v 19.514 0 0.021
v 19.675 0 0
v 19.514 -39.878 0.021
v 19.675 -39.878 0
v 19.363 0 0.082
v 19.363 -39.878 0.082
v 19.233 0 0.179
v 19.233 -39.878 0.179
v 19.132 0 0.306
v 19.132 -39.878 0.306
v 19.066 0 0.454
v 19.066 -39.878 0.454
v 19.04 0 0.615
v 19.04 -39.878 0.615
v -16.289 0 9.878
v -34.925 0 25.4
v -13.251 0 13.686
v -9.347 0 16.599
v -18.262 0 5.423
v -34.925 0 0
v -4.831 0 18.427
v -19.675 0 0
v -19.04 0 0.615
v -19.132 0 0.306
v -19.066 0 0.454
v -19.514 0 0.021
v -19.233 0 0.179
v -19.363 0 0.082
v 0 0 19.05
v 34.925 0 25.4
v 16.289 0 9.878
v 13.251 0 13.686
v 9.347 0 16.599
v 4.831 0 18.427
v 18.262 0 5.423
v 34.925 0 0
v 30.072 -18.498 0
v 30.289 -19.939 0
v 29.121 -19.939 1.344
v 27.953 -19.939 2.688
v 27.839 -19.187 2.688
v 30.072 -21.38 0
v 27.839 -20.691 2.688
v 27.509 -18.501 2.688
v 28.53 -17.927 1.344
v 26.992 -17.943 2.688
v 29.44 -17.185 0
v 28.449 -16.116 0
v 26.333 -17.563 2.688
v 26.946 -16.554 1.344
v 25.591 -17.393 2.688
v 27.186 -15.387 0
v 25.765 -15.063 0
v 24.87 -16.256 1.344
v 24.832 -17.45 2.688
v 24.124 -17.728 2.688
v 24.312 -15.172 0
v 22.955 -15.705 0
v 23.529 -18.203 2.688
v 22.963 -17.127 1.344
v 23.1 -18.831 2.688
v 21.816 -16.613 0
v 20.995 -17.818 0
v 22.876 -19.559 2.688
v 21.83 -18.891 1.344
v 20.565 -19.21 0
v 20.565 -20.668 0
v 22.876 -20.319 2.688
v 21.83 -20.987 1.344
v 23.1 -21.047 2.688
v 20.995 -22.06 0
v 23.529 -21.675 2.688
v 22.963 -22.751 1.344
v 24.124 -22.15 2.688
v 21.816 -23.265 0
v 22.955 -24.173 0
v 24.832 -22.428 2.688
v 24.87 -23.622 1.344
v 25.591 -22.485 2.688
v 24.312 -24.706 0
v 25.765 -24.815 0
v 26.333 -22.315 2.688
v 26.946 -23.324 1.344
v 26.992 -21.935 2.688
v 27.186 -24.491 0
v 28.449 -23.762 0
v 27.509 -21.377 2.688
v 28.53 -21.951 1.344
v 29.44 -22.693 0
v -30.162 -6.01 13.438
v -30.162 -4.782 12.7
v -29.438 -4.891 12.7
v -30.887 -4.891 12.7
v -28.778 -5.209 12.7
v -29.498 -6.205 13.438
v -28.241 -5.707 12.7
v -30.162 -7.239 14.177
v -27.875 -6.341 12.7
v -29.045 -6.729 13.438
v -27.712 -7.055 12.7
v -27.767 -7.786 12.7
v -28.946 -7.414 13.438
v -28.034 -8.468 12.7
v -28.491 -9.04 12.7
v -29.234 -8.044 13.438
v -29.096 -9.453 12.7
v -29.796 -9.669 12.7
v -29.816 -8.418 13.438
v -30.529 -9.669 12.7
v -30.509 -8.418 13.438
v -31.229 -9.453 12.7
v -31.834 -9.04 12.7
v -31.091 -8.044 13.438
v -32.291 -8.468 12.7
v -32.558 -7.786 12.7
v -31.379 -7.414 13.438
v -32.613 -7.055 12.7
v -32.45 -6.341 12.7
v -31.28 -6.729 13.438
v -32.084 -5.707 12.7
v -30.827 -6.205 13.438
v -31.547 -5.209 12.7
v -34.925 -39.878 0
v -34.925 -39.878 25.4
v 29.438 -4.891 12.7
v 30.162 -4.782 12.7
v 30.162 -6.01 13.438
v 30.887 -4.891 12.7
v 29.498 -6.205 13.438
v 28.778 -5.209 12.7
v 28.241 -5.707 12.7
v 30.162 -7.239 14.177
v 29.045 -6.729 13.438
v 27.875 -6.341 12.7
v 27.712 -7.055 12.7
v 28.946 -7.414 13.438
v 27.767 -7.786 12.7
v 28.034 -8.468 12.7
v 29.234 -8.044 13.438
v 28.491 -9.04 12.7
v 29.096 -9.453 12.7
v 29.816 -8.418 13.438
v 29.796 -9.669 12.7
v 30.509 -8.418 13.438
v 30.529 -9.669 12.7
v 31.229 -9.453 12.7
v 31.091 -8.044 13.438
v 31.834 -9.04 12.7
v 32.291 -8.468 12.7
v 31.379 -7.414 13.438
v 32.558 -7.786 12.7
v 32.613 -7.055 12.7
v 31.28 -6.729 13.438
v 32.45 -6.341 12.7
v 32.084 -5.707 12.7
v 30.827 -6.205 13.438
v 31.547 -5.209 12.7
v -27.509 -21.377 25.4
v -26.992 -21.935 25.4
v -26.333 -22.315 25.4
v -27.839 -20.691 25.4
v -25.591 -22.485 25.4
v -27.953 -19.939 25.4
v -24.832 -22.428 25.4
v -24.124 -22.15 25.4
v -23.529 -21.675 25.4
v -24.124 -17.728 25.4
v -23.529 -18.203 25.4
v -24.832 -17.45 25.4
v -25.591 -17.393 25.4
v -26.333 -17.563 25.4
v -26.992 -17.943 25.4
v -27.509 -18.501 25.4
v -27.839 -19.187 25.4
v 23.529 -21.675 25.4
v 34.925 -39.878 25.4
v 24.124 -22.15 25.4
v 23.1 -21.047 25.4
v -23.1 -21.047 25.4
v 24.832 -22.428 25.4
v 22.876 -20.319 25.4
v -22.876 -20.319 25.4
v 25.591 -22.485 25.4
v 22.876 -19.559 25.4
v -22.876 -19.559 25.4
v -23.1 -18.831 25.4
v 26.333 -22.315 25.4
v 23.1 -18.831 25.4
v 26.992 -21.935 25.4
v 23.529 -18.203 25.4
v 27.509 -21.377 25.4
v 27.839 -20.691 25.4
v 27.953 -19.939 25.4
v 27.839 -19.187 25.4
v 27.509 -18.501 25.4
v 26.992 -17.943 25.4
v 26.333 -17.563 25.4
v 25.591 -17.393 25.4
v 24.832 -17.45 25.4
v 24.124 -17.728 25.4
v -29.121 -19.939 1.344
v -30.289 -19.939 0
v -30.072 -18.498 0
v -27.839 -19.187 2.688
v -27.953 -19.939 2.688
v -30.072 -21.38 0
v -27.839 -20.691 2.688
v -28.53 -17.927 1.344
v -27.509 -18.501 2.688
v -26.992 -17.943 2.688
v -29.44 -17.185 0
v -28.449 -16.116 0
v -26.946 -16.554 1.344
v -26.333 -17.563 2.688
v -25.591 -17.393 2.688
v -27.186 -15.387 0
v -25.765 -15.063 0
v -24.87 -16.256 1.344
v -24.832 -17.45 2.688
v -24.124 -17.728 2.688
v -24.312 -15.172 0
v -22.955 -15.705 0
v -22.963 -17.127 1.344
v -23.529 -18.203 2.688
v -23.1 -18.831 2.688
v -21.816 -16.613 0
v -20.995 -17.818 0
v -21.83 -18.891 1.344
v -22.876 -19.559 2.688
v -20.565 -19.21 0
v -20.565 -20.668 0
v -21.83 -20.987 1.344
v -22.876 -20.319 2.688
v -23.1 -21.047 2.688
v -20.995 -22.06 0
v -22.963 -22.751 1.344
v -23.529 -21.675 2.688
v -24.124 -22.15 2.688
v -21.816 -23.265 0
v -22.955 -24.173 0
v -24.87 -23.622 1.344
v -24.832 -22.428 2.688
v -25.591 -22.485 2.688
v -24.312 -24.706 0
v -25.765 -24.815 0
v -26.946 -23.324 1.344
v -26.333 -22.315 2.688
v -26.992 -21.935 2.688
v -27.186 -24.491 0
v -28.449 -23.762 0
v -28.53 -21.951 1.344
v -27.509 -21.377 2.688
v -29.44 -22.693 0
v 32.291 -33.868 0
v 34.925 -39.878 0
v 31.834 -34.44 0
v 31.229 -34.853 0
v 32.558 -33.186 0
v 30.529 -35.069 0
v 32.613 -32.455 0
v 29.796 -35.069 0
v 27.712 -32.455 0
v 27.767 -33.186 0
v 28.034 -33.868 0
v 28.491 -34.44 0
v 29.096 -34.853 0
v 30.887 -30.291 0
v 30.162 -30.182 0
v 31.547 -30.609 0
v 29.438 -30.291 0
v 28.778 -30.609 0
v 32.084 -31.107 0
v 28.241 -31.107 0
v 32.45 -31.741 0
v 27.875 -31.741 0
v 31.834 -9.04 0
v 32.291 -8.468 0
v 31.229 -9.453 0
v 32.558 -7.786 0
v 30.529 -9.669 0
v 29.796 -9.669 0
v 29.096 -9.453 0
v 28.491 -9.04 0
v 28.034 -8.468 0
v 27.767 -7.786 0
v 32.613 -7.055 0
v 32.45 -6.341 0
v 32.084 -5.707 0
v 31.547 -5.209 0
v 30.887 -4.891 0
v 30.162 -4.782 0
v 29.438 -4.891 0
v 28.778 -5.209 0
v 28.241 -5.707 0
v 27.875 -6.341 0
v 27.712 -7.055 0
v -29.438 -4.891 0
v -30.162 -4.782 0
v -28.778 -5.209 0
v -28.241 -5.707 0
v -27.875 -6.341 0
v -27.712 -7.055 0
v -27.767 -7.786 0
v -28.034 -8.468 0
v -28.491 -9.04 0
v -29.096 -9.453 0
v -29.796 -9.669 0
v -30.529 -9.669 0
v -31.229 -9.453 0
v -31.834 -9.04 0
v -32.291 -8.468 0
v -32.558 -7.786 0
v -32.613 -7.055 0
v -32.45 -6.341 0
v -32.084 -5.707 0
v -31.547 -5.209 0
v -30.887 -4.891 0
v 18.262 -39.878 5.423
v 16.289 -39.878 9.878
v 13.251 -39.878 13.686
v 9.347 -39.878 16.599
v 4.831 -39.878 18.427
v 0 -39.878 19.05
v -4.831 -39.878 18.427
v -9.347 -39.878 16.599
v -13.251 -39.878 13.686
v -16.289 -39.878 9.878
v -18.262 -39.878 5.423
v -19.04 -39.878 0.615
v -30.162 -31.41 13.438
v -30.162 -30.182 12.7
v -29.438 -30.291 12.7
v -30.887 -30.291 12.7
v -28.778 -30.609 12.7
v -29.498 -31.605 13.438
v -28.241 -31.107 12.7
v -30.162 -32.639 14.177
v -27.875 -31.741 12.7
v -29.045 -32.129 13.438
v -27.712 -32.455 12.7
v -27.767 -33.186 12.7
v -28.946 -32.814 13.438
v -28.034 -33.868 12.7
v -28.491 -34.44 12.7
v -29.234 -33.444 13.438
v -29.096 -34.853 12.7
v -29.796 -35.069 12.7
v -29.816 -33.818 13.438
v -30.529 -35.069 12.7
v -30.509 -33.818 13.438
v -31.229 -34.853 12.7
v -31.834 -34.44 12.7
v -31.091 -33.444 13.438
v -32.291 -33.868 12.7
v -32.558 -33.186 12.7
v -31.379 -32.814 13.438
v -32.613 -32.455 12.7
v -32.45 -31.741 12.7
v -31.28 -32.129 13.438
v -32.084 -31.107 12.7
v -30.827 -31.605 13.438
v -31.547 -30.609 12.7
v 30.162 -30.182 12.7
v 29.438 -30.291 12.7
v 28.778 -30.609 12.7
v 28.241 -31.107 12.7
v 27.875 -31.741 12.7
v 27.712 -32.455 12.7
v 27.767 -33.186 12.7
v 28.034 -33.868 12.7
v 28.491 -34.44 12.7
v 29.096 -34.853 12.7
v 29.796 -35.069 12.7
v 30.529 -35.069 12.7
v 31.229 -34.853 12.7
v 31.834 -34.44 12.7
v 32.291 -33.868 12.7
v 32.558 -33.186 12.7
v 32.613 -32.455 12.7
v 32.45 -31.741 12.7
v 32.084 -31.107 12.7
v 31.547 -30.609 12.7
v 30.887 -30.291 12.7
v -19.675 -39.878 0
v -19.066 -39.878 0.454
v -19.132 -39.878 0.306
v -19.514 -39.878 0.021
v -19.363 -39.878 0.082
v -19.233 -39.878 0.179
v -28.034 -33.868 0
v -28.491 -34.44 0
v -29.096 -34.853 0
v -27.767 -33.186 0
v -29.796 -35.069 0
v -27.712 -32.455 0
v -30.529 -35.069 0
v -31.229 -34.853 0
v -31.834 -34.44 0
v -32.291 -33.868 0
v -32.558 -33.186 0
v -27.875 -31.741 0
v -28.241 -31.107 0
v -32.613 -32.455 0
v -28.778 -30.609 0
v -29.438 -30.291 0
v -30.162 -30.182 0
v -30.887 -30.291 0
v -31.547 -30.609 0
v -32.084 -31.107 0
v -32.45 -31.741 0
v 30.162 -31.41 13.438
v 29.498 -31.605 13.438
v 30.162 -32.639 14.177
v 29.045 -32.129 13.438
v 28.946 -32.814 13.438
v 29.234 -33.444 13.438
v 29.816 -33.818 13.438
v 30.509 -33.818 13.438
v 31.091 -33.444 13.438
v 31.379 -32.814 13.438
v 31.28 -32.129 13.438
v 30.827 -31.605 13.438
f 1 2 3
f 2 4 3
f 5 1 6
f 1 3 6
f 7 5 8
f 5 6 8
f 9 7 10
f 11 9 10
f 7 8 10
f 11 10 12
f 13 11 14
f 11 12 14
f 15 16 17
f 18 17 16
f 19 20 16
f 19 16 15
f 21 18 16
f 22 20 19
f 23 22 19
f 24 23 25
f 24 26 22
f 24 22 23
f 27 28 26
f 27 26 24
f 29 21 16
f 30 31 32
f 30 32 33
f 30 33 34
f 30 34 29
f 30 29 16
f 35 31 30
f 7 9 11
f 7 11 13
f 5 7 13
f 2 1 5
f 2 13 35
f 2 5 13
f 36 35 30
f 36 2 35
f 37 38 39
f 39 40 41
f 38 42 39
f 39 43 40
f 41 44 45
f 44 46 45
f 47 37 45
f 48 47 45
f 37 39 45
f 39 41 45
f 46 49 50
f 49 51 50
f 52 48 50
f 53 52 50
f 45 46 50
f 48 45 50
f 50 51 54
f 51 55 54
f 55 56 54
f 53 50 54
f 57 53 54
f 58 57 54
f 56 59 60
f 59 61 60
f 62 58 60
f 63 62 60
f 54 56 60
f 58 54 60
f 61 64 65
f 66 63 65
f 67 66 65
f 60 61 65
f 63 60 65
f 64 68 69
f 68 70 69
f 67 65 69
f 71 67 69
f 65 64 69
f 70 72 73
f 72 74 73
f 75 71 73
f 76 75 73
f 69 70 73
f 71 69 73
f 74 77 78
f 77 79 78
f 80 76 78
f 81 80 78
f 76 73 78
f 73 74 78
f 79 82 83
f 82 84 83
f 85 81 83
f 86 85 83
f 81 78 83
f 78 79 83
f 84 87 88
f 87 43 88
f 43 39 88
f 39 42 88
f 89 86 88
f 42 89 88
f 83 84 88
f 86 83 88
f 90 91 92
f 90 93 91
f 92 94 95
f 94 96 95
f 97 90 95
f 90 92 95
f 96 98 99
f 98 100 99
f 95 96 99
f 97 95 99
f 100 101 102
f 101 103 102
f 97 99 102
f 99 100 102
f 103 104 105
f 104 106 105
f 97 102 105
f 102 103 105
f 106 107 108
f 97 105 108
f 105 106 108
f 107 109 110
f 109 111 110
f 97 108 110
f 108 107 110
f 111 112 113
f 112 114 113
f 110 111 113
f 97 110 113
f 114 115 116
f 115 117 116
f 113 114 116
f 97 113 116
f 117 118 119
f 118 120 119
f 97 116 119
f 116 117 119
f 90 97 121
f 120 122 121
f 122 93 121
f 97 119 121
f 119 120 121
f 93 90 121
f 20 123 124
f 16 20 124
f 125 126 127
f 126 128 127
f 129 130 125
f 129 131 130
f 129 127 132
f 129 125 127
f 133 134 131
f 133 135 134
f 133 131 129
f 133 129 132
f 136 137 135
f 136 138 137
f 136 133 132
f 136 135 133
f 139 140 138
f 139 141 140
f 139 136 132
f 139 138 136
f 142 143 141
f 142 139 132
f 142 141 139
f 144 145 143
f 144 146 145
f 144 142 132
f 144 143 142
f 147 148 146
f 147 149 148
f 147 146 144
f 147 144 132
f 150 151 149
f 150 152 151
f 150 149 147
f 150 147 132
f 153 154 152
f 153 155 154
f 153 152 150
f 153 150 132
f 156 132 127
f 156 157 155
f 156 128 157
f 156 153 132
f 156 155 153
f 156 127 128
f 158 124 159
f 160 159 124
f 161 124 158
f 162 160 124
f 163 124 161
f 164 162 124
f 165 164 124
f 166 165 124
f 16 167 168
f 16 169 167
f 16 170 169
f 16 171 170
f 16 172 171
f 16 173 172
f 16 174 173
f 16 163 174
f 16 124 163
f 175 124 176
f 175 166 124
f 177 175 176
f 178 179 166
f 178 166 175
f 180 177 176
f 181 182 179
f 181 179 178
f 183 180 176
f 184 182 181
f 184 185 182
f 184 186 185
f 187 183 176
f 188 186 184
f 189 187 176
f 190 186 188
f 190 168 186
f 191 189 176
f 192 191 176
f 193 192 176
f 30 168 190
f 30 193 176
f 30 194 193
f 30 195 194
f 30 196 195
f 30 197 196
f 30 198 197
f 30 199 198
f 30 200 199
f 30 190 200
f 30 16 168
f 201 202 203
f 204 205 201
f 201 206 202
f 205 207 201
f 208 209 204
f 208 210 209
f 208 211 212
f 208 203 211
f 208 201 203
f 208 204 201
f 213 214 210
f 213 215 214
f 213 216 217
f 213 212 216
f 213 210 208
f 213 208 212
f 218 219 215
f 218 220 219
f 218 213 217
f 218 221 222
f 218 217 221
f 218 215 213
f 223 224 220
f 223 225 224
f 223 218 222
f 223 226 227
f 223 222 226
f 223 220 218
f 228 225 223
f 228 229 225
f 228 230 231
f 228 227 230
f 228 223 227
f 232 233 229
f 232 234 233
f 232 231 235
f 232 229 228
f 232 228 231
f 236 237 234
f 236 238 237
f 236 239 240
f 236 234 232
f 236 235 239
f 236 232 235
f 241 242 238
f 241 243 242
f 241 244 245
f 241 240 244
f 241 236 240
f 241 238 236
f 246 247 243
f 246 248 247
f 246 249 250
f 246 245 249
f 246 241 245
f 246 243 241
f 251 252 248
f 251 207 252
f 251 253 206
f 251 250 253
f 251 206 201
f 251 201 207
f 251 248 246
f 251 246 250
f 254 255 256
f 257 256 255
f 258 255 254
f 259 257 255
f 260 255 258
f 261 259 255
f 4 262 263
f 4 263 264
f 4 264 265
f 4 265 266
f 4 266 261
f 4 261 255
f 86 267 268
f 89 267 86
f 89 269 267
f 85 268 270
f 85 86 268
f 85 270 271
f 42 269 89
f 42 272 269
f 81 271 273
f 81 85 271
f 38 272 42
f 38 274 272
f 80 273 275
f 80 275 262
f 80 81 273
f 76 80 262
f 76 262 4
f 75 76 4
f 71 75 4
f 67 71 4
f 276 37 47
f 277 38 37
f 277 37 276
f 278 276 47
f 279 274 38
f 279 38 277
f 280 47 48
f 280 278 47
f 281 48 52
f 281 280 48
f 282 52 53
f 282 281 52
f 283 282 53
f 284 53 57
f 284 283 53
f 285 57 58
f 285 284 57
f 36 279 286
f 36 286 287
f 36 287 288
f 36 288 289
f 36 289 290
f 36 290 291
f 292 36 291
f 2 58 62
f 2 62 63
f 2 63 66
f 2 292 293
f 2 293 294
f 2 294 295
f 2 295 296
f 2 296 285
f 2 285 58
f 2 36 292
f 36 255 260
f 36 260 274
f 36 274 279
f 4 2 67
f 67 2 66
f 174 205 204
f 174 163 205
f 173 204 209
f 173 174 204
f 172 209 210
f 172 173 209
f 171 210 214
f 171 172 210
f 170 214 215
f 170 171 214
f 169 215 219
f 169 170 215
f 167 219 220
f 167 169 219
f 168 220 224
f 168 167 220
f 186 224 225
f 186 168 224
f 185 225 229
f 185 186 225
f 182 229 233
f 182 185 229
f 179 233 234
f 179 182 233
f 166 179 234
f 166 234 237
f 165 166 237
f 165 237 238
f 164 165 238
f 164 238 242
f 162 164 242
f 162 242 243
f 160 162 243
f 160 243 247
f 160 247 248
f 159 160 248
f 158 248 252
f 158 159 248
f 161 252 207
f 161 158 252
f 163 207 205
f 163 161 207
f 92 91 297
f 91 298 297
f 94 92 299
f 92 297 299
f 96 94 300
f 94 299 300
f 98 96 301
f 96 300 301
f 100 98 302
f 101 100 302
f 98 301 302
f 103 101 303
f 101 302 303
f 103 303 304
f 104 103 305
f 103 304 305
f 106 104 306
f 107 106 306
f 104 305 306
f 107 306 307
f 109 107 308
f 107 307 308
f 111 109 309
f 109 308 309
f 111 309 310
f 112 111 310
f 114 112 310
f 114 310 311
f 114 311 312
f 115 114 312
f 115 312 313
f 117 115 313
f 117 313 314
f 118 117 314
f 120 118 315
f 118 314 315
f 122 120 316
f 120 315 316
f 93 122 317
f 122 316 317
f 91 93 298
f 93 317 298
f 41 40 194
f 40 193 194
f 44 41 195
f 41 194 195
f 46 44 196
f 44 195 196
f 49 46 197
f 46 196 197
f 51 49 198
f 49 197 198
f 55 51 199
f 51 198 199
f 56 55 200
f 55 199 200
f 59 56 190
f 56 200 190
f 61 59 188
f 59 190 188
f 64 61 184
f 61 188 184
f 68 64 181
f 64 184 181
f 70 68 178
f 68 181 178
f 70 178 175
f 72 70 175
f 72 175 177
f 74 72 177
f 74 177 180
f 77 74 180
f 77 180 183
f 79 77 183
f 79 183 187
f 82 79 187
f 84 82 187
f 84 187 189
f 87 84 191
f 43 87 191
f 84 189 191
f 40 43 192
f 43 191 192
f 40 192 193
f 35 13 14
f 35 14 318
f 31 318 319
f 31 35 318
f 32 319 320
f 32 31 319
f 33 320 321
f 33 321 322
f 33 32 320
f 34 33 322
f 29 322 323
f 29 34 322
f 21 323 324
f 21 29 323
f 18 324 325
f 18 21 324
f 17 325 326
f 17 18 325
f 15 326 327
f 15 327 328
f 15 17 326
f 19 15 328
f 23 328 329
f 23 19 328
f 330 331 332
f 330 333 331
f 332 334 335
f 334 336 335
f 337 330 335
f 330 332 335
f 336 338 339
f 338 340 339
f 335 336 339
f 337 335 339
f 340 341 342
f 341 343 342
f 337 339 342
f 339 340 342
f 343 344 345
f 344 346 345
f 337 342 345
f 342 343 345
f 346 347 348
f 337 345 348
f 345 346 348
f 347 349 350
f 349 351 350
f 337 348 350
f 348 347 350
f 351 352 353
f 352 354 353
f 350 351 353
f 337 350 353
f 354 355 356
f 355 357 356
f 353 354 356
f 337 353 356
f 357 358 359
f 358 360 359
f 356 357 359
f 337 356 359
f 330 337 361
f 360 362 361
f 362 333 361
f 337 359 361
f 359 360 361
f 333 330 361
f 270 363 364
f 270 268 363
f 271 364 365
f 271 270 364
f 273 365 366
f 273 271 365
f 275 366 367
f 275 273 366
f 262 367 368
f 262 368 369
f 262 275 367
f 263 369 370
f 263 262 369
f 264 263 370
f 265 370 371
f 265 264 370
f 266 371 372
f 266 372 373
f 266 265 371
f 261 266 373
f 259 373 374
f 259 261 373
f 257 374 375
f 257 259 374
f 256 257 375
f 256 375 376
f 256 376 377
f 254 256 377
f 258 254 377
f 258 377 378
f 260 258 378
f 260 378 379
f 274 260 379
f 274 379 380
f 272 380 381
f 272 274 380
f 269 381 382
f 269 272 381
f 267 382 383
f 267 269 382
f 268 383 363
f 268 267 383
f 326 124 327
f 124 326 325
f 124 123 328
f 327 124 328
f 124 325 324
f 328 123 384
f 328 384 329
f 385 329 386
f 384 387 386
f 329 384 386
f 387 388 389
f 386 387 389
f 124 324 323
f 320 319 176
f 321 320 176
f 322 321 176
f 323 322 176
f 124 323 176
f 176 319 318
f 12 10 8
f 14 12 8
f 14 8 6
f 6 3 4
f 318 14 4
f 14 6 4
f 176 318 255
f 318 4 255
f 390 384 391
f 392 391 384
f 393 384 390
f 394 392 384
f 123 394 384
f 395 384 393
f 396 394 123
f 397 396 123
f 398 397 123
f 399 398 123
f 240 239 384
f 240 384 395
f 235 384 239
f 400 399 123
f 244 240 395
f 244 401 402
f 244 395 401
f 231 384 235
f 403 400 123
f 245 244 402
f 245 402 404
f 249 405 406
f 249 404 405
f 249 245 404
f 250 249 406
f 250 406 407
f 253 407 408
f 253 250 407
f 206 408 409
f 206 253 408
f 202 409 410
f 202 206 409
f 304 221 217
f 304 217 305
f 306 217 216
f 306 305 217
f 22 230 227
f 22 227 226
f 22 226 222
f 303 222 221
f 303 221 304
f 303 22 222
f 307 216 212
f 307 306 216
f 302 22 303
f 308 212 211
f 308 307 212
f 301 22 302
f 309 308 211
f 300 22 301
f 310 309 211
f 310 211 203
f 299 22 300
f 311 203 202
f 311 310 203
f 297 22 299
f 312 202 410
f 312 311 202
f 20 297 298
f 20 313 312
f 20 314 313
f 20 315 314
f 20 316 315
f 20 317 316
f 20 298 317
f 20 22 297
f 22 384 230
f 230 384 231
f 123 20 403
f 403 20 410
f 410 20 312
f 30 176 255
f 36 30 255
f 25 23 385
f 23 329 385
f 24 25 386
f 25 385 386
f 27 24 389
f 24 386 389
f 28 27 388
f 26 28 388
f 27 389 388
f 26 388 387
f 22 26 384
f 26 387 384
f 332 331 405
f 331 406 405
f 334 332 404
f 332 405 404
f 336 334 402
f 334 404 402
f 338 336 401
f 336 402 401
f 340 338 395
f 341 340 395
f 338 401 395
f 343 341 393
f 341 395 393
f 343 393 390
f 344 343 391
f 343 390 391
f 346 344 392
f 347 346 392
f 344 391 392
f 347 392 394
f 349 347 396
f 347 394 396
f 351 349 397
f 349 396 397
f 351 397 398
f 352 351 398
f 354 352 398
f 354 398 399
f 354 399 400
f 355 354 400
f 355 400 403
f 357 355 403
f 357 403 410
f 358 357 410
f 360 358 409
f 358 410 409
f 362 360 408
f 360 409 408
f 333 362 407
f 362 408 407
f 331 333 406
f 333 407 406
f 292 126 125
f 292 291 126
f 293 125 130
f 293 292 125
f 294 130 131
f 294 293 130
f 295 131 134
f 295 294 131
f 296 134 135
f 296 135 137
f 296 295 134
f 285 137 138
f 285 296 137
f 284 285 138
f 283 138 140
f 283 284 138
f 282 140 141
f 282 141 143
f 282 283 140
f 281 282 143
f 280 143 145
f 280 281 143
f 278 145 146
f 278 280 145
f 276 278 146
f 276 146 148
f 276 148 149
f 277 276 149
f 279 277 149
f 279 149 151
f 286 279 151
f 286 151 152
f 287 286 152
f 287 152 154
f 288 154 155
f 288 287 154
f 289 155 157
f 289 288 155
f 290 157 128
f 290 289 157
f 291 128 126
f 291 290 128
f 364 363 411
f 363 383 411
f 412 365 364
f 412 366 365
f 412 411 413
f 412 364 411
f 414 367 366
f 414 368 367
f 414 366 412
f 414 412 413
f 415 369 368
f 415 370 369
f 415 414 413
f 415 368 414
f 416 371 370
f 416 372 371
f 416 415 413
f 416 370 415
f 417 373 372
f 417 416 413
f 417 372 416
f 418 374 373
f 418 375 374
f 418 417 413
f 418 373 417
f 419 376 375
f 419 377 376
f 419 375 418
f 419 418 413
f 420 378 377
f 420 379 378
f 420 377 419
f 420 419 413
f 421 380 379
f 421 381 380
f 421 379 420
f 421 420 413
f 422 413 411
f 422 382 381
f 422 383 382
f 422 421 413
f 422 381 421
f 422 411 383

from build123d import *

# Parameters (mm, degrees)
BOSS_EXTRUDE2_DEPTH                                = 39.878
FILLET1_R                                          = 0.635
CSK_FOR_10_FLAT_HEAD_MACHINE_SCREW_100_D           = 5.1054
CSK_FOR_10_FLAT_HEAD_MACHINE_SCREW_100_CSINK_D     = 9.779
CSK_FOR_10_FLAT_HEAD_MACHINE_SCREW_100_CSINK_ANGLE = 82
F_10_0_1935_DIAMETER_HOLE2_AT_2_COUNT              = 2
F_10_0_1935_DIAMETER_HOLE2_AT_2_PITCH              = 25.4


with BuildPart() as part:
    # Sketch5 → Boss-Extrude2 (new body)
    with BuildSketch(Plane(origin=(0, 0, 0), x_dir=(1, 0, 0), z_dir=(0, 1, 0))):
        with BuildLine():
            Line((-34.925, 0), (-34.925, -25.4))
            Line((-34.925, -25.4), (34.925, -25.4))
            Line((34.925, -25.4), (34.925, 0))
            Line((34.925, 0), (19.05, 0))
            ThreePointArc((19.05, 0), (0, -19.05), (-19.05, 0))
            Line((-19.05, 0), (-34.925, 0))
        make_face()
    extrude(amount=-BOSS_EXTRUDE2_DEPTH)

    # Fillet1
    fillet1_edges = [part.edges().sort_by_distance(p)[0] for p in [
        (-19.05, -19.939, 0),
        (19.05, -19.939, 0),
    ]]
    fillet(fillet1_edges, radius=FILLET1_R)

    # CSK for #10 Flat Head Machine Screw (100)1 (through all)
    with Locations(Plane(origin=(0, 0, 0), x_dir=(-1, 0, 0), z_dir=(0, 0, -1))):
        with Locations((-25.4, -19.939)):
            csk_for_10_flat_head_machine_screw_100 = CounterSinkHole(CSK_FOR_10_FLAT_HEAD_MACHINE_SCREW_100_D / 2, CSK_FOR_10_FLAT_HEAD_MACHINE_SCREW_100_CSINK_D / 2, counter_sink_angle=CSK_FOR_10_FLAT_HEAD_MACHINE_SCREW_100_CSINK_ANGLE)

    # Sketch12 → #10 (0.1935) Diameter Hole2 (revolve, cut)
    with BuildSketch(Plane(origin=(30.1625, -7.239, 0), x_dir=(0, 1, 0), z_dir=(1, 0, 0))):
        Polygon((0, 0), (0, 14.176584928), (2.45745, 12.7), (2.45745, 0), align=None)
    f_10_0_1935_diameter_hole2 = revolve(axis=Axis((30.1625, -7.239, -6.35), (0, 0, 1)), mode=Mode.SUBTRACT)

    # #10 (0.1935) Diameter Hole2 at 2: #10 (0.1935) Diameter Hole2 ×2
    with Locations(*[(0, -i * F_10_0_1935_DIAMETER_HOLE2_AT_2_PITCH, 0) for i in range(1, F_10_0_1935_DIAMETER_HOLE2_AT_2_COUNT)]):
        add(f_10_0_1935_diameter_hole2, mode=Mode.SUBTRACT)

    # Mirror1: #10 (0.1935) Diameter Hole2, CSK for #10 Flat Head Machine Screw (100)1 across plane
    add(f_10_0_1935_diameter_hole2.mirror(Plane(origin=(0, 0, 0), x_dir=(0, 0, 1), z_dir=(1, 0, 0))), mode=Mode.SUBTRACT)
    add(csk_for_10_flat_head_machine_screw_100.mirror(Plane(origin=(0, 0, 0), x_dir=(0, 0, 1), z_dir=(1, 0, 0))), mode=Mode.SUBTRACT)

    # Mirror1 copy 1 sketch → Mirror1 copy 1 (revolve, cut)
    with BuildSketch(Plane(origin=(-30.1625, -32.639, 0), x_dir=(0, 1, 0), z_dir=(-1, 0, 0))):
        Polygon((0, 0), (0, -14.176584928), (2.45745, -12.7), (2.45745, 0), align=None)
    revolve(axis=Axis((-30.1625, -32.639, -6.35), (0, 0, -1)), mode=Mode.SUBTRACT)


solid = part.part
